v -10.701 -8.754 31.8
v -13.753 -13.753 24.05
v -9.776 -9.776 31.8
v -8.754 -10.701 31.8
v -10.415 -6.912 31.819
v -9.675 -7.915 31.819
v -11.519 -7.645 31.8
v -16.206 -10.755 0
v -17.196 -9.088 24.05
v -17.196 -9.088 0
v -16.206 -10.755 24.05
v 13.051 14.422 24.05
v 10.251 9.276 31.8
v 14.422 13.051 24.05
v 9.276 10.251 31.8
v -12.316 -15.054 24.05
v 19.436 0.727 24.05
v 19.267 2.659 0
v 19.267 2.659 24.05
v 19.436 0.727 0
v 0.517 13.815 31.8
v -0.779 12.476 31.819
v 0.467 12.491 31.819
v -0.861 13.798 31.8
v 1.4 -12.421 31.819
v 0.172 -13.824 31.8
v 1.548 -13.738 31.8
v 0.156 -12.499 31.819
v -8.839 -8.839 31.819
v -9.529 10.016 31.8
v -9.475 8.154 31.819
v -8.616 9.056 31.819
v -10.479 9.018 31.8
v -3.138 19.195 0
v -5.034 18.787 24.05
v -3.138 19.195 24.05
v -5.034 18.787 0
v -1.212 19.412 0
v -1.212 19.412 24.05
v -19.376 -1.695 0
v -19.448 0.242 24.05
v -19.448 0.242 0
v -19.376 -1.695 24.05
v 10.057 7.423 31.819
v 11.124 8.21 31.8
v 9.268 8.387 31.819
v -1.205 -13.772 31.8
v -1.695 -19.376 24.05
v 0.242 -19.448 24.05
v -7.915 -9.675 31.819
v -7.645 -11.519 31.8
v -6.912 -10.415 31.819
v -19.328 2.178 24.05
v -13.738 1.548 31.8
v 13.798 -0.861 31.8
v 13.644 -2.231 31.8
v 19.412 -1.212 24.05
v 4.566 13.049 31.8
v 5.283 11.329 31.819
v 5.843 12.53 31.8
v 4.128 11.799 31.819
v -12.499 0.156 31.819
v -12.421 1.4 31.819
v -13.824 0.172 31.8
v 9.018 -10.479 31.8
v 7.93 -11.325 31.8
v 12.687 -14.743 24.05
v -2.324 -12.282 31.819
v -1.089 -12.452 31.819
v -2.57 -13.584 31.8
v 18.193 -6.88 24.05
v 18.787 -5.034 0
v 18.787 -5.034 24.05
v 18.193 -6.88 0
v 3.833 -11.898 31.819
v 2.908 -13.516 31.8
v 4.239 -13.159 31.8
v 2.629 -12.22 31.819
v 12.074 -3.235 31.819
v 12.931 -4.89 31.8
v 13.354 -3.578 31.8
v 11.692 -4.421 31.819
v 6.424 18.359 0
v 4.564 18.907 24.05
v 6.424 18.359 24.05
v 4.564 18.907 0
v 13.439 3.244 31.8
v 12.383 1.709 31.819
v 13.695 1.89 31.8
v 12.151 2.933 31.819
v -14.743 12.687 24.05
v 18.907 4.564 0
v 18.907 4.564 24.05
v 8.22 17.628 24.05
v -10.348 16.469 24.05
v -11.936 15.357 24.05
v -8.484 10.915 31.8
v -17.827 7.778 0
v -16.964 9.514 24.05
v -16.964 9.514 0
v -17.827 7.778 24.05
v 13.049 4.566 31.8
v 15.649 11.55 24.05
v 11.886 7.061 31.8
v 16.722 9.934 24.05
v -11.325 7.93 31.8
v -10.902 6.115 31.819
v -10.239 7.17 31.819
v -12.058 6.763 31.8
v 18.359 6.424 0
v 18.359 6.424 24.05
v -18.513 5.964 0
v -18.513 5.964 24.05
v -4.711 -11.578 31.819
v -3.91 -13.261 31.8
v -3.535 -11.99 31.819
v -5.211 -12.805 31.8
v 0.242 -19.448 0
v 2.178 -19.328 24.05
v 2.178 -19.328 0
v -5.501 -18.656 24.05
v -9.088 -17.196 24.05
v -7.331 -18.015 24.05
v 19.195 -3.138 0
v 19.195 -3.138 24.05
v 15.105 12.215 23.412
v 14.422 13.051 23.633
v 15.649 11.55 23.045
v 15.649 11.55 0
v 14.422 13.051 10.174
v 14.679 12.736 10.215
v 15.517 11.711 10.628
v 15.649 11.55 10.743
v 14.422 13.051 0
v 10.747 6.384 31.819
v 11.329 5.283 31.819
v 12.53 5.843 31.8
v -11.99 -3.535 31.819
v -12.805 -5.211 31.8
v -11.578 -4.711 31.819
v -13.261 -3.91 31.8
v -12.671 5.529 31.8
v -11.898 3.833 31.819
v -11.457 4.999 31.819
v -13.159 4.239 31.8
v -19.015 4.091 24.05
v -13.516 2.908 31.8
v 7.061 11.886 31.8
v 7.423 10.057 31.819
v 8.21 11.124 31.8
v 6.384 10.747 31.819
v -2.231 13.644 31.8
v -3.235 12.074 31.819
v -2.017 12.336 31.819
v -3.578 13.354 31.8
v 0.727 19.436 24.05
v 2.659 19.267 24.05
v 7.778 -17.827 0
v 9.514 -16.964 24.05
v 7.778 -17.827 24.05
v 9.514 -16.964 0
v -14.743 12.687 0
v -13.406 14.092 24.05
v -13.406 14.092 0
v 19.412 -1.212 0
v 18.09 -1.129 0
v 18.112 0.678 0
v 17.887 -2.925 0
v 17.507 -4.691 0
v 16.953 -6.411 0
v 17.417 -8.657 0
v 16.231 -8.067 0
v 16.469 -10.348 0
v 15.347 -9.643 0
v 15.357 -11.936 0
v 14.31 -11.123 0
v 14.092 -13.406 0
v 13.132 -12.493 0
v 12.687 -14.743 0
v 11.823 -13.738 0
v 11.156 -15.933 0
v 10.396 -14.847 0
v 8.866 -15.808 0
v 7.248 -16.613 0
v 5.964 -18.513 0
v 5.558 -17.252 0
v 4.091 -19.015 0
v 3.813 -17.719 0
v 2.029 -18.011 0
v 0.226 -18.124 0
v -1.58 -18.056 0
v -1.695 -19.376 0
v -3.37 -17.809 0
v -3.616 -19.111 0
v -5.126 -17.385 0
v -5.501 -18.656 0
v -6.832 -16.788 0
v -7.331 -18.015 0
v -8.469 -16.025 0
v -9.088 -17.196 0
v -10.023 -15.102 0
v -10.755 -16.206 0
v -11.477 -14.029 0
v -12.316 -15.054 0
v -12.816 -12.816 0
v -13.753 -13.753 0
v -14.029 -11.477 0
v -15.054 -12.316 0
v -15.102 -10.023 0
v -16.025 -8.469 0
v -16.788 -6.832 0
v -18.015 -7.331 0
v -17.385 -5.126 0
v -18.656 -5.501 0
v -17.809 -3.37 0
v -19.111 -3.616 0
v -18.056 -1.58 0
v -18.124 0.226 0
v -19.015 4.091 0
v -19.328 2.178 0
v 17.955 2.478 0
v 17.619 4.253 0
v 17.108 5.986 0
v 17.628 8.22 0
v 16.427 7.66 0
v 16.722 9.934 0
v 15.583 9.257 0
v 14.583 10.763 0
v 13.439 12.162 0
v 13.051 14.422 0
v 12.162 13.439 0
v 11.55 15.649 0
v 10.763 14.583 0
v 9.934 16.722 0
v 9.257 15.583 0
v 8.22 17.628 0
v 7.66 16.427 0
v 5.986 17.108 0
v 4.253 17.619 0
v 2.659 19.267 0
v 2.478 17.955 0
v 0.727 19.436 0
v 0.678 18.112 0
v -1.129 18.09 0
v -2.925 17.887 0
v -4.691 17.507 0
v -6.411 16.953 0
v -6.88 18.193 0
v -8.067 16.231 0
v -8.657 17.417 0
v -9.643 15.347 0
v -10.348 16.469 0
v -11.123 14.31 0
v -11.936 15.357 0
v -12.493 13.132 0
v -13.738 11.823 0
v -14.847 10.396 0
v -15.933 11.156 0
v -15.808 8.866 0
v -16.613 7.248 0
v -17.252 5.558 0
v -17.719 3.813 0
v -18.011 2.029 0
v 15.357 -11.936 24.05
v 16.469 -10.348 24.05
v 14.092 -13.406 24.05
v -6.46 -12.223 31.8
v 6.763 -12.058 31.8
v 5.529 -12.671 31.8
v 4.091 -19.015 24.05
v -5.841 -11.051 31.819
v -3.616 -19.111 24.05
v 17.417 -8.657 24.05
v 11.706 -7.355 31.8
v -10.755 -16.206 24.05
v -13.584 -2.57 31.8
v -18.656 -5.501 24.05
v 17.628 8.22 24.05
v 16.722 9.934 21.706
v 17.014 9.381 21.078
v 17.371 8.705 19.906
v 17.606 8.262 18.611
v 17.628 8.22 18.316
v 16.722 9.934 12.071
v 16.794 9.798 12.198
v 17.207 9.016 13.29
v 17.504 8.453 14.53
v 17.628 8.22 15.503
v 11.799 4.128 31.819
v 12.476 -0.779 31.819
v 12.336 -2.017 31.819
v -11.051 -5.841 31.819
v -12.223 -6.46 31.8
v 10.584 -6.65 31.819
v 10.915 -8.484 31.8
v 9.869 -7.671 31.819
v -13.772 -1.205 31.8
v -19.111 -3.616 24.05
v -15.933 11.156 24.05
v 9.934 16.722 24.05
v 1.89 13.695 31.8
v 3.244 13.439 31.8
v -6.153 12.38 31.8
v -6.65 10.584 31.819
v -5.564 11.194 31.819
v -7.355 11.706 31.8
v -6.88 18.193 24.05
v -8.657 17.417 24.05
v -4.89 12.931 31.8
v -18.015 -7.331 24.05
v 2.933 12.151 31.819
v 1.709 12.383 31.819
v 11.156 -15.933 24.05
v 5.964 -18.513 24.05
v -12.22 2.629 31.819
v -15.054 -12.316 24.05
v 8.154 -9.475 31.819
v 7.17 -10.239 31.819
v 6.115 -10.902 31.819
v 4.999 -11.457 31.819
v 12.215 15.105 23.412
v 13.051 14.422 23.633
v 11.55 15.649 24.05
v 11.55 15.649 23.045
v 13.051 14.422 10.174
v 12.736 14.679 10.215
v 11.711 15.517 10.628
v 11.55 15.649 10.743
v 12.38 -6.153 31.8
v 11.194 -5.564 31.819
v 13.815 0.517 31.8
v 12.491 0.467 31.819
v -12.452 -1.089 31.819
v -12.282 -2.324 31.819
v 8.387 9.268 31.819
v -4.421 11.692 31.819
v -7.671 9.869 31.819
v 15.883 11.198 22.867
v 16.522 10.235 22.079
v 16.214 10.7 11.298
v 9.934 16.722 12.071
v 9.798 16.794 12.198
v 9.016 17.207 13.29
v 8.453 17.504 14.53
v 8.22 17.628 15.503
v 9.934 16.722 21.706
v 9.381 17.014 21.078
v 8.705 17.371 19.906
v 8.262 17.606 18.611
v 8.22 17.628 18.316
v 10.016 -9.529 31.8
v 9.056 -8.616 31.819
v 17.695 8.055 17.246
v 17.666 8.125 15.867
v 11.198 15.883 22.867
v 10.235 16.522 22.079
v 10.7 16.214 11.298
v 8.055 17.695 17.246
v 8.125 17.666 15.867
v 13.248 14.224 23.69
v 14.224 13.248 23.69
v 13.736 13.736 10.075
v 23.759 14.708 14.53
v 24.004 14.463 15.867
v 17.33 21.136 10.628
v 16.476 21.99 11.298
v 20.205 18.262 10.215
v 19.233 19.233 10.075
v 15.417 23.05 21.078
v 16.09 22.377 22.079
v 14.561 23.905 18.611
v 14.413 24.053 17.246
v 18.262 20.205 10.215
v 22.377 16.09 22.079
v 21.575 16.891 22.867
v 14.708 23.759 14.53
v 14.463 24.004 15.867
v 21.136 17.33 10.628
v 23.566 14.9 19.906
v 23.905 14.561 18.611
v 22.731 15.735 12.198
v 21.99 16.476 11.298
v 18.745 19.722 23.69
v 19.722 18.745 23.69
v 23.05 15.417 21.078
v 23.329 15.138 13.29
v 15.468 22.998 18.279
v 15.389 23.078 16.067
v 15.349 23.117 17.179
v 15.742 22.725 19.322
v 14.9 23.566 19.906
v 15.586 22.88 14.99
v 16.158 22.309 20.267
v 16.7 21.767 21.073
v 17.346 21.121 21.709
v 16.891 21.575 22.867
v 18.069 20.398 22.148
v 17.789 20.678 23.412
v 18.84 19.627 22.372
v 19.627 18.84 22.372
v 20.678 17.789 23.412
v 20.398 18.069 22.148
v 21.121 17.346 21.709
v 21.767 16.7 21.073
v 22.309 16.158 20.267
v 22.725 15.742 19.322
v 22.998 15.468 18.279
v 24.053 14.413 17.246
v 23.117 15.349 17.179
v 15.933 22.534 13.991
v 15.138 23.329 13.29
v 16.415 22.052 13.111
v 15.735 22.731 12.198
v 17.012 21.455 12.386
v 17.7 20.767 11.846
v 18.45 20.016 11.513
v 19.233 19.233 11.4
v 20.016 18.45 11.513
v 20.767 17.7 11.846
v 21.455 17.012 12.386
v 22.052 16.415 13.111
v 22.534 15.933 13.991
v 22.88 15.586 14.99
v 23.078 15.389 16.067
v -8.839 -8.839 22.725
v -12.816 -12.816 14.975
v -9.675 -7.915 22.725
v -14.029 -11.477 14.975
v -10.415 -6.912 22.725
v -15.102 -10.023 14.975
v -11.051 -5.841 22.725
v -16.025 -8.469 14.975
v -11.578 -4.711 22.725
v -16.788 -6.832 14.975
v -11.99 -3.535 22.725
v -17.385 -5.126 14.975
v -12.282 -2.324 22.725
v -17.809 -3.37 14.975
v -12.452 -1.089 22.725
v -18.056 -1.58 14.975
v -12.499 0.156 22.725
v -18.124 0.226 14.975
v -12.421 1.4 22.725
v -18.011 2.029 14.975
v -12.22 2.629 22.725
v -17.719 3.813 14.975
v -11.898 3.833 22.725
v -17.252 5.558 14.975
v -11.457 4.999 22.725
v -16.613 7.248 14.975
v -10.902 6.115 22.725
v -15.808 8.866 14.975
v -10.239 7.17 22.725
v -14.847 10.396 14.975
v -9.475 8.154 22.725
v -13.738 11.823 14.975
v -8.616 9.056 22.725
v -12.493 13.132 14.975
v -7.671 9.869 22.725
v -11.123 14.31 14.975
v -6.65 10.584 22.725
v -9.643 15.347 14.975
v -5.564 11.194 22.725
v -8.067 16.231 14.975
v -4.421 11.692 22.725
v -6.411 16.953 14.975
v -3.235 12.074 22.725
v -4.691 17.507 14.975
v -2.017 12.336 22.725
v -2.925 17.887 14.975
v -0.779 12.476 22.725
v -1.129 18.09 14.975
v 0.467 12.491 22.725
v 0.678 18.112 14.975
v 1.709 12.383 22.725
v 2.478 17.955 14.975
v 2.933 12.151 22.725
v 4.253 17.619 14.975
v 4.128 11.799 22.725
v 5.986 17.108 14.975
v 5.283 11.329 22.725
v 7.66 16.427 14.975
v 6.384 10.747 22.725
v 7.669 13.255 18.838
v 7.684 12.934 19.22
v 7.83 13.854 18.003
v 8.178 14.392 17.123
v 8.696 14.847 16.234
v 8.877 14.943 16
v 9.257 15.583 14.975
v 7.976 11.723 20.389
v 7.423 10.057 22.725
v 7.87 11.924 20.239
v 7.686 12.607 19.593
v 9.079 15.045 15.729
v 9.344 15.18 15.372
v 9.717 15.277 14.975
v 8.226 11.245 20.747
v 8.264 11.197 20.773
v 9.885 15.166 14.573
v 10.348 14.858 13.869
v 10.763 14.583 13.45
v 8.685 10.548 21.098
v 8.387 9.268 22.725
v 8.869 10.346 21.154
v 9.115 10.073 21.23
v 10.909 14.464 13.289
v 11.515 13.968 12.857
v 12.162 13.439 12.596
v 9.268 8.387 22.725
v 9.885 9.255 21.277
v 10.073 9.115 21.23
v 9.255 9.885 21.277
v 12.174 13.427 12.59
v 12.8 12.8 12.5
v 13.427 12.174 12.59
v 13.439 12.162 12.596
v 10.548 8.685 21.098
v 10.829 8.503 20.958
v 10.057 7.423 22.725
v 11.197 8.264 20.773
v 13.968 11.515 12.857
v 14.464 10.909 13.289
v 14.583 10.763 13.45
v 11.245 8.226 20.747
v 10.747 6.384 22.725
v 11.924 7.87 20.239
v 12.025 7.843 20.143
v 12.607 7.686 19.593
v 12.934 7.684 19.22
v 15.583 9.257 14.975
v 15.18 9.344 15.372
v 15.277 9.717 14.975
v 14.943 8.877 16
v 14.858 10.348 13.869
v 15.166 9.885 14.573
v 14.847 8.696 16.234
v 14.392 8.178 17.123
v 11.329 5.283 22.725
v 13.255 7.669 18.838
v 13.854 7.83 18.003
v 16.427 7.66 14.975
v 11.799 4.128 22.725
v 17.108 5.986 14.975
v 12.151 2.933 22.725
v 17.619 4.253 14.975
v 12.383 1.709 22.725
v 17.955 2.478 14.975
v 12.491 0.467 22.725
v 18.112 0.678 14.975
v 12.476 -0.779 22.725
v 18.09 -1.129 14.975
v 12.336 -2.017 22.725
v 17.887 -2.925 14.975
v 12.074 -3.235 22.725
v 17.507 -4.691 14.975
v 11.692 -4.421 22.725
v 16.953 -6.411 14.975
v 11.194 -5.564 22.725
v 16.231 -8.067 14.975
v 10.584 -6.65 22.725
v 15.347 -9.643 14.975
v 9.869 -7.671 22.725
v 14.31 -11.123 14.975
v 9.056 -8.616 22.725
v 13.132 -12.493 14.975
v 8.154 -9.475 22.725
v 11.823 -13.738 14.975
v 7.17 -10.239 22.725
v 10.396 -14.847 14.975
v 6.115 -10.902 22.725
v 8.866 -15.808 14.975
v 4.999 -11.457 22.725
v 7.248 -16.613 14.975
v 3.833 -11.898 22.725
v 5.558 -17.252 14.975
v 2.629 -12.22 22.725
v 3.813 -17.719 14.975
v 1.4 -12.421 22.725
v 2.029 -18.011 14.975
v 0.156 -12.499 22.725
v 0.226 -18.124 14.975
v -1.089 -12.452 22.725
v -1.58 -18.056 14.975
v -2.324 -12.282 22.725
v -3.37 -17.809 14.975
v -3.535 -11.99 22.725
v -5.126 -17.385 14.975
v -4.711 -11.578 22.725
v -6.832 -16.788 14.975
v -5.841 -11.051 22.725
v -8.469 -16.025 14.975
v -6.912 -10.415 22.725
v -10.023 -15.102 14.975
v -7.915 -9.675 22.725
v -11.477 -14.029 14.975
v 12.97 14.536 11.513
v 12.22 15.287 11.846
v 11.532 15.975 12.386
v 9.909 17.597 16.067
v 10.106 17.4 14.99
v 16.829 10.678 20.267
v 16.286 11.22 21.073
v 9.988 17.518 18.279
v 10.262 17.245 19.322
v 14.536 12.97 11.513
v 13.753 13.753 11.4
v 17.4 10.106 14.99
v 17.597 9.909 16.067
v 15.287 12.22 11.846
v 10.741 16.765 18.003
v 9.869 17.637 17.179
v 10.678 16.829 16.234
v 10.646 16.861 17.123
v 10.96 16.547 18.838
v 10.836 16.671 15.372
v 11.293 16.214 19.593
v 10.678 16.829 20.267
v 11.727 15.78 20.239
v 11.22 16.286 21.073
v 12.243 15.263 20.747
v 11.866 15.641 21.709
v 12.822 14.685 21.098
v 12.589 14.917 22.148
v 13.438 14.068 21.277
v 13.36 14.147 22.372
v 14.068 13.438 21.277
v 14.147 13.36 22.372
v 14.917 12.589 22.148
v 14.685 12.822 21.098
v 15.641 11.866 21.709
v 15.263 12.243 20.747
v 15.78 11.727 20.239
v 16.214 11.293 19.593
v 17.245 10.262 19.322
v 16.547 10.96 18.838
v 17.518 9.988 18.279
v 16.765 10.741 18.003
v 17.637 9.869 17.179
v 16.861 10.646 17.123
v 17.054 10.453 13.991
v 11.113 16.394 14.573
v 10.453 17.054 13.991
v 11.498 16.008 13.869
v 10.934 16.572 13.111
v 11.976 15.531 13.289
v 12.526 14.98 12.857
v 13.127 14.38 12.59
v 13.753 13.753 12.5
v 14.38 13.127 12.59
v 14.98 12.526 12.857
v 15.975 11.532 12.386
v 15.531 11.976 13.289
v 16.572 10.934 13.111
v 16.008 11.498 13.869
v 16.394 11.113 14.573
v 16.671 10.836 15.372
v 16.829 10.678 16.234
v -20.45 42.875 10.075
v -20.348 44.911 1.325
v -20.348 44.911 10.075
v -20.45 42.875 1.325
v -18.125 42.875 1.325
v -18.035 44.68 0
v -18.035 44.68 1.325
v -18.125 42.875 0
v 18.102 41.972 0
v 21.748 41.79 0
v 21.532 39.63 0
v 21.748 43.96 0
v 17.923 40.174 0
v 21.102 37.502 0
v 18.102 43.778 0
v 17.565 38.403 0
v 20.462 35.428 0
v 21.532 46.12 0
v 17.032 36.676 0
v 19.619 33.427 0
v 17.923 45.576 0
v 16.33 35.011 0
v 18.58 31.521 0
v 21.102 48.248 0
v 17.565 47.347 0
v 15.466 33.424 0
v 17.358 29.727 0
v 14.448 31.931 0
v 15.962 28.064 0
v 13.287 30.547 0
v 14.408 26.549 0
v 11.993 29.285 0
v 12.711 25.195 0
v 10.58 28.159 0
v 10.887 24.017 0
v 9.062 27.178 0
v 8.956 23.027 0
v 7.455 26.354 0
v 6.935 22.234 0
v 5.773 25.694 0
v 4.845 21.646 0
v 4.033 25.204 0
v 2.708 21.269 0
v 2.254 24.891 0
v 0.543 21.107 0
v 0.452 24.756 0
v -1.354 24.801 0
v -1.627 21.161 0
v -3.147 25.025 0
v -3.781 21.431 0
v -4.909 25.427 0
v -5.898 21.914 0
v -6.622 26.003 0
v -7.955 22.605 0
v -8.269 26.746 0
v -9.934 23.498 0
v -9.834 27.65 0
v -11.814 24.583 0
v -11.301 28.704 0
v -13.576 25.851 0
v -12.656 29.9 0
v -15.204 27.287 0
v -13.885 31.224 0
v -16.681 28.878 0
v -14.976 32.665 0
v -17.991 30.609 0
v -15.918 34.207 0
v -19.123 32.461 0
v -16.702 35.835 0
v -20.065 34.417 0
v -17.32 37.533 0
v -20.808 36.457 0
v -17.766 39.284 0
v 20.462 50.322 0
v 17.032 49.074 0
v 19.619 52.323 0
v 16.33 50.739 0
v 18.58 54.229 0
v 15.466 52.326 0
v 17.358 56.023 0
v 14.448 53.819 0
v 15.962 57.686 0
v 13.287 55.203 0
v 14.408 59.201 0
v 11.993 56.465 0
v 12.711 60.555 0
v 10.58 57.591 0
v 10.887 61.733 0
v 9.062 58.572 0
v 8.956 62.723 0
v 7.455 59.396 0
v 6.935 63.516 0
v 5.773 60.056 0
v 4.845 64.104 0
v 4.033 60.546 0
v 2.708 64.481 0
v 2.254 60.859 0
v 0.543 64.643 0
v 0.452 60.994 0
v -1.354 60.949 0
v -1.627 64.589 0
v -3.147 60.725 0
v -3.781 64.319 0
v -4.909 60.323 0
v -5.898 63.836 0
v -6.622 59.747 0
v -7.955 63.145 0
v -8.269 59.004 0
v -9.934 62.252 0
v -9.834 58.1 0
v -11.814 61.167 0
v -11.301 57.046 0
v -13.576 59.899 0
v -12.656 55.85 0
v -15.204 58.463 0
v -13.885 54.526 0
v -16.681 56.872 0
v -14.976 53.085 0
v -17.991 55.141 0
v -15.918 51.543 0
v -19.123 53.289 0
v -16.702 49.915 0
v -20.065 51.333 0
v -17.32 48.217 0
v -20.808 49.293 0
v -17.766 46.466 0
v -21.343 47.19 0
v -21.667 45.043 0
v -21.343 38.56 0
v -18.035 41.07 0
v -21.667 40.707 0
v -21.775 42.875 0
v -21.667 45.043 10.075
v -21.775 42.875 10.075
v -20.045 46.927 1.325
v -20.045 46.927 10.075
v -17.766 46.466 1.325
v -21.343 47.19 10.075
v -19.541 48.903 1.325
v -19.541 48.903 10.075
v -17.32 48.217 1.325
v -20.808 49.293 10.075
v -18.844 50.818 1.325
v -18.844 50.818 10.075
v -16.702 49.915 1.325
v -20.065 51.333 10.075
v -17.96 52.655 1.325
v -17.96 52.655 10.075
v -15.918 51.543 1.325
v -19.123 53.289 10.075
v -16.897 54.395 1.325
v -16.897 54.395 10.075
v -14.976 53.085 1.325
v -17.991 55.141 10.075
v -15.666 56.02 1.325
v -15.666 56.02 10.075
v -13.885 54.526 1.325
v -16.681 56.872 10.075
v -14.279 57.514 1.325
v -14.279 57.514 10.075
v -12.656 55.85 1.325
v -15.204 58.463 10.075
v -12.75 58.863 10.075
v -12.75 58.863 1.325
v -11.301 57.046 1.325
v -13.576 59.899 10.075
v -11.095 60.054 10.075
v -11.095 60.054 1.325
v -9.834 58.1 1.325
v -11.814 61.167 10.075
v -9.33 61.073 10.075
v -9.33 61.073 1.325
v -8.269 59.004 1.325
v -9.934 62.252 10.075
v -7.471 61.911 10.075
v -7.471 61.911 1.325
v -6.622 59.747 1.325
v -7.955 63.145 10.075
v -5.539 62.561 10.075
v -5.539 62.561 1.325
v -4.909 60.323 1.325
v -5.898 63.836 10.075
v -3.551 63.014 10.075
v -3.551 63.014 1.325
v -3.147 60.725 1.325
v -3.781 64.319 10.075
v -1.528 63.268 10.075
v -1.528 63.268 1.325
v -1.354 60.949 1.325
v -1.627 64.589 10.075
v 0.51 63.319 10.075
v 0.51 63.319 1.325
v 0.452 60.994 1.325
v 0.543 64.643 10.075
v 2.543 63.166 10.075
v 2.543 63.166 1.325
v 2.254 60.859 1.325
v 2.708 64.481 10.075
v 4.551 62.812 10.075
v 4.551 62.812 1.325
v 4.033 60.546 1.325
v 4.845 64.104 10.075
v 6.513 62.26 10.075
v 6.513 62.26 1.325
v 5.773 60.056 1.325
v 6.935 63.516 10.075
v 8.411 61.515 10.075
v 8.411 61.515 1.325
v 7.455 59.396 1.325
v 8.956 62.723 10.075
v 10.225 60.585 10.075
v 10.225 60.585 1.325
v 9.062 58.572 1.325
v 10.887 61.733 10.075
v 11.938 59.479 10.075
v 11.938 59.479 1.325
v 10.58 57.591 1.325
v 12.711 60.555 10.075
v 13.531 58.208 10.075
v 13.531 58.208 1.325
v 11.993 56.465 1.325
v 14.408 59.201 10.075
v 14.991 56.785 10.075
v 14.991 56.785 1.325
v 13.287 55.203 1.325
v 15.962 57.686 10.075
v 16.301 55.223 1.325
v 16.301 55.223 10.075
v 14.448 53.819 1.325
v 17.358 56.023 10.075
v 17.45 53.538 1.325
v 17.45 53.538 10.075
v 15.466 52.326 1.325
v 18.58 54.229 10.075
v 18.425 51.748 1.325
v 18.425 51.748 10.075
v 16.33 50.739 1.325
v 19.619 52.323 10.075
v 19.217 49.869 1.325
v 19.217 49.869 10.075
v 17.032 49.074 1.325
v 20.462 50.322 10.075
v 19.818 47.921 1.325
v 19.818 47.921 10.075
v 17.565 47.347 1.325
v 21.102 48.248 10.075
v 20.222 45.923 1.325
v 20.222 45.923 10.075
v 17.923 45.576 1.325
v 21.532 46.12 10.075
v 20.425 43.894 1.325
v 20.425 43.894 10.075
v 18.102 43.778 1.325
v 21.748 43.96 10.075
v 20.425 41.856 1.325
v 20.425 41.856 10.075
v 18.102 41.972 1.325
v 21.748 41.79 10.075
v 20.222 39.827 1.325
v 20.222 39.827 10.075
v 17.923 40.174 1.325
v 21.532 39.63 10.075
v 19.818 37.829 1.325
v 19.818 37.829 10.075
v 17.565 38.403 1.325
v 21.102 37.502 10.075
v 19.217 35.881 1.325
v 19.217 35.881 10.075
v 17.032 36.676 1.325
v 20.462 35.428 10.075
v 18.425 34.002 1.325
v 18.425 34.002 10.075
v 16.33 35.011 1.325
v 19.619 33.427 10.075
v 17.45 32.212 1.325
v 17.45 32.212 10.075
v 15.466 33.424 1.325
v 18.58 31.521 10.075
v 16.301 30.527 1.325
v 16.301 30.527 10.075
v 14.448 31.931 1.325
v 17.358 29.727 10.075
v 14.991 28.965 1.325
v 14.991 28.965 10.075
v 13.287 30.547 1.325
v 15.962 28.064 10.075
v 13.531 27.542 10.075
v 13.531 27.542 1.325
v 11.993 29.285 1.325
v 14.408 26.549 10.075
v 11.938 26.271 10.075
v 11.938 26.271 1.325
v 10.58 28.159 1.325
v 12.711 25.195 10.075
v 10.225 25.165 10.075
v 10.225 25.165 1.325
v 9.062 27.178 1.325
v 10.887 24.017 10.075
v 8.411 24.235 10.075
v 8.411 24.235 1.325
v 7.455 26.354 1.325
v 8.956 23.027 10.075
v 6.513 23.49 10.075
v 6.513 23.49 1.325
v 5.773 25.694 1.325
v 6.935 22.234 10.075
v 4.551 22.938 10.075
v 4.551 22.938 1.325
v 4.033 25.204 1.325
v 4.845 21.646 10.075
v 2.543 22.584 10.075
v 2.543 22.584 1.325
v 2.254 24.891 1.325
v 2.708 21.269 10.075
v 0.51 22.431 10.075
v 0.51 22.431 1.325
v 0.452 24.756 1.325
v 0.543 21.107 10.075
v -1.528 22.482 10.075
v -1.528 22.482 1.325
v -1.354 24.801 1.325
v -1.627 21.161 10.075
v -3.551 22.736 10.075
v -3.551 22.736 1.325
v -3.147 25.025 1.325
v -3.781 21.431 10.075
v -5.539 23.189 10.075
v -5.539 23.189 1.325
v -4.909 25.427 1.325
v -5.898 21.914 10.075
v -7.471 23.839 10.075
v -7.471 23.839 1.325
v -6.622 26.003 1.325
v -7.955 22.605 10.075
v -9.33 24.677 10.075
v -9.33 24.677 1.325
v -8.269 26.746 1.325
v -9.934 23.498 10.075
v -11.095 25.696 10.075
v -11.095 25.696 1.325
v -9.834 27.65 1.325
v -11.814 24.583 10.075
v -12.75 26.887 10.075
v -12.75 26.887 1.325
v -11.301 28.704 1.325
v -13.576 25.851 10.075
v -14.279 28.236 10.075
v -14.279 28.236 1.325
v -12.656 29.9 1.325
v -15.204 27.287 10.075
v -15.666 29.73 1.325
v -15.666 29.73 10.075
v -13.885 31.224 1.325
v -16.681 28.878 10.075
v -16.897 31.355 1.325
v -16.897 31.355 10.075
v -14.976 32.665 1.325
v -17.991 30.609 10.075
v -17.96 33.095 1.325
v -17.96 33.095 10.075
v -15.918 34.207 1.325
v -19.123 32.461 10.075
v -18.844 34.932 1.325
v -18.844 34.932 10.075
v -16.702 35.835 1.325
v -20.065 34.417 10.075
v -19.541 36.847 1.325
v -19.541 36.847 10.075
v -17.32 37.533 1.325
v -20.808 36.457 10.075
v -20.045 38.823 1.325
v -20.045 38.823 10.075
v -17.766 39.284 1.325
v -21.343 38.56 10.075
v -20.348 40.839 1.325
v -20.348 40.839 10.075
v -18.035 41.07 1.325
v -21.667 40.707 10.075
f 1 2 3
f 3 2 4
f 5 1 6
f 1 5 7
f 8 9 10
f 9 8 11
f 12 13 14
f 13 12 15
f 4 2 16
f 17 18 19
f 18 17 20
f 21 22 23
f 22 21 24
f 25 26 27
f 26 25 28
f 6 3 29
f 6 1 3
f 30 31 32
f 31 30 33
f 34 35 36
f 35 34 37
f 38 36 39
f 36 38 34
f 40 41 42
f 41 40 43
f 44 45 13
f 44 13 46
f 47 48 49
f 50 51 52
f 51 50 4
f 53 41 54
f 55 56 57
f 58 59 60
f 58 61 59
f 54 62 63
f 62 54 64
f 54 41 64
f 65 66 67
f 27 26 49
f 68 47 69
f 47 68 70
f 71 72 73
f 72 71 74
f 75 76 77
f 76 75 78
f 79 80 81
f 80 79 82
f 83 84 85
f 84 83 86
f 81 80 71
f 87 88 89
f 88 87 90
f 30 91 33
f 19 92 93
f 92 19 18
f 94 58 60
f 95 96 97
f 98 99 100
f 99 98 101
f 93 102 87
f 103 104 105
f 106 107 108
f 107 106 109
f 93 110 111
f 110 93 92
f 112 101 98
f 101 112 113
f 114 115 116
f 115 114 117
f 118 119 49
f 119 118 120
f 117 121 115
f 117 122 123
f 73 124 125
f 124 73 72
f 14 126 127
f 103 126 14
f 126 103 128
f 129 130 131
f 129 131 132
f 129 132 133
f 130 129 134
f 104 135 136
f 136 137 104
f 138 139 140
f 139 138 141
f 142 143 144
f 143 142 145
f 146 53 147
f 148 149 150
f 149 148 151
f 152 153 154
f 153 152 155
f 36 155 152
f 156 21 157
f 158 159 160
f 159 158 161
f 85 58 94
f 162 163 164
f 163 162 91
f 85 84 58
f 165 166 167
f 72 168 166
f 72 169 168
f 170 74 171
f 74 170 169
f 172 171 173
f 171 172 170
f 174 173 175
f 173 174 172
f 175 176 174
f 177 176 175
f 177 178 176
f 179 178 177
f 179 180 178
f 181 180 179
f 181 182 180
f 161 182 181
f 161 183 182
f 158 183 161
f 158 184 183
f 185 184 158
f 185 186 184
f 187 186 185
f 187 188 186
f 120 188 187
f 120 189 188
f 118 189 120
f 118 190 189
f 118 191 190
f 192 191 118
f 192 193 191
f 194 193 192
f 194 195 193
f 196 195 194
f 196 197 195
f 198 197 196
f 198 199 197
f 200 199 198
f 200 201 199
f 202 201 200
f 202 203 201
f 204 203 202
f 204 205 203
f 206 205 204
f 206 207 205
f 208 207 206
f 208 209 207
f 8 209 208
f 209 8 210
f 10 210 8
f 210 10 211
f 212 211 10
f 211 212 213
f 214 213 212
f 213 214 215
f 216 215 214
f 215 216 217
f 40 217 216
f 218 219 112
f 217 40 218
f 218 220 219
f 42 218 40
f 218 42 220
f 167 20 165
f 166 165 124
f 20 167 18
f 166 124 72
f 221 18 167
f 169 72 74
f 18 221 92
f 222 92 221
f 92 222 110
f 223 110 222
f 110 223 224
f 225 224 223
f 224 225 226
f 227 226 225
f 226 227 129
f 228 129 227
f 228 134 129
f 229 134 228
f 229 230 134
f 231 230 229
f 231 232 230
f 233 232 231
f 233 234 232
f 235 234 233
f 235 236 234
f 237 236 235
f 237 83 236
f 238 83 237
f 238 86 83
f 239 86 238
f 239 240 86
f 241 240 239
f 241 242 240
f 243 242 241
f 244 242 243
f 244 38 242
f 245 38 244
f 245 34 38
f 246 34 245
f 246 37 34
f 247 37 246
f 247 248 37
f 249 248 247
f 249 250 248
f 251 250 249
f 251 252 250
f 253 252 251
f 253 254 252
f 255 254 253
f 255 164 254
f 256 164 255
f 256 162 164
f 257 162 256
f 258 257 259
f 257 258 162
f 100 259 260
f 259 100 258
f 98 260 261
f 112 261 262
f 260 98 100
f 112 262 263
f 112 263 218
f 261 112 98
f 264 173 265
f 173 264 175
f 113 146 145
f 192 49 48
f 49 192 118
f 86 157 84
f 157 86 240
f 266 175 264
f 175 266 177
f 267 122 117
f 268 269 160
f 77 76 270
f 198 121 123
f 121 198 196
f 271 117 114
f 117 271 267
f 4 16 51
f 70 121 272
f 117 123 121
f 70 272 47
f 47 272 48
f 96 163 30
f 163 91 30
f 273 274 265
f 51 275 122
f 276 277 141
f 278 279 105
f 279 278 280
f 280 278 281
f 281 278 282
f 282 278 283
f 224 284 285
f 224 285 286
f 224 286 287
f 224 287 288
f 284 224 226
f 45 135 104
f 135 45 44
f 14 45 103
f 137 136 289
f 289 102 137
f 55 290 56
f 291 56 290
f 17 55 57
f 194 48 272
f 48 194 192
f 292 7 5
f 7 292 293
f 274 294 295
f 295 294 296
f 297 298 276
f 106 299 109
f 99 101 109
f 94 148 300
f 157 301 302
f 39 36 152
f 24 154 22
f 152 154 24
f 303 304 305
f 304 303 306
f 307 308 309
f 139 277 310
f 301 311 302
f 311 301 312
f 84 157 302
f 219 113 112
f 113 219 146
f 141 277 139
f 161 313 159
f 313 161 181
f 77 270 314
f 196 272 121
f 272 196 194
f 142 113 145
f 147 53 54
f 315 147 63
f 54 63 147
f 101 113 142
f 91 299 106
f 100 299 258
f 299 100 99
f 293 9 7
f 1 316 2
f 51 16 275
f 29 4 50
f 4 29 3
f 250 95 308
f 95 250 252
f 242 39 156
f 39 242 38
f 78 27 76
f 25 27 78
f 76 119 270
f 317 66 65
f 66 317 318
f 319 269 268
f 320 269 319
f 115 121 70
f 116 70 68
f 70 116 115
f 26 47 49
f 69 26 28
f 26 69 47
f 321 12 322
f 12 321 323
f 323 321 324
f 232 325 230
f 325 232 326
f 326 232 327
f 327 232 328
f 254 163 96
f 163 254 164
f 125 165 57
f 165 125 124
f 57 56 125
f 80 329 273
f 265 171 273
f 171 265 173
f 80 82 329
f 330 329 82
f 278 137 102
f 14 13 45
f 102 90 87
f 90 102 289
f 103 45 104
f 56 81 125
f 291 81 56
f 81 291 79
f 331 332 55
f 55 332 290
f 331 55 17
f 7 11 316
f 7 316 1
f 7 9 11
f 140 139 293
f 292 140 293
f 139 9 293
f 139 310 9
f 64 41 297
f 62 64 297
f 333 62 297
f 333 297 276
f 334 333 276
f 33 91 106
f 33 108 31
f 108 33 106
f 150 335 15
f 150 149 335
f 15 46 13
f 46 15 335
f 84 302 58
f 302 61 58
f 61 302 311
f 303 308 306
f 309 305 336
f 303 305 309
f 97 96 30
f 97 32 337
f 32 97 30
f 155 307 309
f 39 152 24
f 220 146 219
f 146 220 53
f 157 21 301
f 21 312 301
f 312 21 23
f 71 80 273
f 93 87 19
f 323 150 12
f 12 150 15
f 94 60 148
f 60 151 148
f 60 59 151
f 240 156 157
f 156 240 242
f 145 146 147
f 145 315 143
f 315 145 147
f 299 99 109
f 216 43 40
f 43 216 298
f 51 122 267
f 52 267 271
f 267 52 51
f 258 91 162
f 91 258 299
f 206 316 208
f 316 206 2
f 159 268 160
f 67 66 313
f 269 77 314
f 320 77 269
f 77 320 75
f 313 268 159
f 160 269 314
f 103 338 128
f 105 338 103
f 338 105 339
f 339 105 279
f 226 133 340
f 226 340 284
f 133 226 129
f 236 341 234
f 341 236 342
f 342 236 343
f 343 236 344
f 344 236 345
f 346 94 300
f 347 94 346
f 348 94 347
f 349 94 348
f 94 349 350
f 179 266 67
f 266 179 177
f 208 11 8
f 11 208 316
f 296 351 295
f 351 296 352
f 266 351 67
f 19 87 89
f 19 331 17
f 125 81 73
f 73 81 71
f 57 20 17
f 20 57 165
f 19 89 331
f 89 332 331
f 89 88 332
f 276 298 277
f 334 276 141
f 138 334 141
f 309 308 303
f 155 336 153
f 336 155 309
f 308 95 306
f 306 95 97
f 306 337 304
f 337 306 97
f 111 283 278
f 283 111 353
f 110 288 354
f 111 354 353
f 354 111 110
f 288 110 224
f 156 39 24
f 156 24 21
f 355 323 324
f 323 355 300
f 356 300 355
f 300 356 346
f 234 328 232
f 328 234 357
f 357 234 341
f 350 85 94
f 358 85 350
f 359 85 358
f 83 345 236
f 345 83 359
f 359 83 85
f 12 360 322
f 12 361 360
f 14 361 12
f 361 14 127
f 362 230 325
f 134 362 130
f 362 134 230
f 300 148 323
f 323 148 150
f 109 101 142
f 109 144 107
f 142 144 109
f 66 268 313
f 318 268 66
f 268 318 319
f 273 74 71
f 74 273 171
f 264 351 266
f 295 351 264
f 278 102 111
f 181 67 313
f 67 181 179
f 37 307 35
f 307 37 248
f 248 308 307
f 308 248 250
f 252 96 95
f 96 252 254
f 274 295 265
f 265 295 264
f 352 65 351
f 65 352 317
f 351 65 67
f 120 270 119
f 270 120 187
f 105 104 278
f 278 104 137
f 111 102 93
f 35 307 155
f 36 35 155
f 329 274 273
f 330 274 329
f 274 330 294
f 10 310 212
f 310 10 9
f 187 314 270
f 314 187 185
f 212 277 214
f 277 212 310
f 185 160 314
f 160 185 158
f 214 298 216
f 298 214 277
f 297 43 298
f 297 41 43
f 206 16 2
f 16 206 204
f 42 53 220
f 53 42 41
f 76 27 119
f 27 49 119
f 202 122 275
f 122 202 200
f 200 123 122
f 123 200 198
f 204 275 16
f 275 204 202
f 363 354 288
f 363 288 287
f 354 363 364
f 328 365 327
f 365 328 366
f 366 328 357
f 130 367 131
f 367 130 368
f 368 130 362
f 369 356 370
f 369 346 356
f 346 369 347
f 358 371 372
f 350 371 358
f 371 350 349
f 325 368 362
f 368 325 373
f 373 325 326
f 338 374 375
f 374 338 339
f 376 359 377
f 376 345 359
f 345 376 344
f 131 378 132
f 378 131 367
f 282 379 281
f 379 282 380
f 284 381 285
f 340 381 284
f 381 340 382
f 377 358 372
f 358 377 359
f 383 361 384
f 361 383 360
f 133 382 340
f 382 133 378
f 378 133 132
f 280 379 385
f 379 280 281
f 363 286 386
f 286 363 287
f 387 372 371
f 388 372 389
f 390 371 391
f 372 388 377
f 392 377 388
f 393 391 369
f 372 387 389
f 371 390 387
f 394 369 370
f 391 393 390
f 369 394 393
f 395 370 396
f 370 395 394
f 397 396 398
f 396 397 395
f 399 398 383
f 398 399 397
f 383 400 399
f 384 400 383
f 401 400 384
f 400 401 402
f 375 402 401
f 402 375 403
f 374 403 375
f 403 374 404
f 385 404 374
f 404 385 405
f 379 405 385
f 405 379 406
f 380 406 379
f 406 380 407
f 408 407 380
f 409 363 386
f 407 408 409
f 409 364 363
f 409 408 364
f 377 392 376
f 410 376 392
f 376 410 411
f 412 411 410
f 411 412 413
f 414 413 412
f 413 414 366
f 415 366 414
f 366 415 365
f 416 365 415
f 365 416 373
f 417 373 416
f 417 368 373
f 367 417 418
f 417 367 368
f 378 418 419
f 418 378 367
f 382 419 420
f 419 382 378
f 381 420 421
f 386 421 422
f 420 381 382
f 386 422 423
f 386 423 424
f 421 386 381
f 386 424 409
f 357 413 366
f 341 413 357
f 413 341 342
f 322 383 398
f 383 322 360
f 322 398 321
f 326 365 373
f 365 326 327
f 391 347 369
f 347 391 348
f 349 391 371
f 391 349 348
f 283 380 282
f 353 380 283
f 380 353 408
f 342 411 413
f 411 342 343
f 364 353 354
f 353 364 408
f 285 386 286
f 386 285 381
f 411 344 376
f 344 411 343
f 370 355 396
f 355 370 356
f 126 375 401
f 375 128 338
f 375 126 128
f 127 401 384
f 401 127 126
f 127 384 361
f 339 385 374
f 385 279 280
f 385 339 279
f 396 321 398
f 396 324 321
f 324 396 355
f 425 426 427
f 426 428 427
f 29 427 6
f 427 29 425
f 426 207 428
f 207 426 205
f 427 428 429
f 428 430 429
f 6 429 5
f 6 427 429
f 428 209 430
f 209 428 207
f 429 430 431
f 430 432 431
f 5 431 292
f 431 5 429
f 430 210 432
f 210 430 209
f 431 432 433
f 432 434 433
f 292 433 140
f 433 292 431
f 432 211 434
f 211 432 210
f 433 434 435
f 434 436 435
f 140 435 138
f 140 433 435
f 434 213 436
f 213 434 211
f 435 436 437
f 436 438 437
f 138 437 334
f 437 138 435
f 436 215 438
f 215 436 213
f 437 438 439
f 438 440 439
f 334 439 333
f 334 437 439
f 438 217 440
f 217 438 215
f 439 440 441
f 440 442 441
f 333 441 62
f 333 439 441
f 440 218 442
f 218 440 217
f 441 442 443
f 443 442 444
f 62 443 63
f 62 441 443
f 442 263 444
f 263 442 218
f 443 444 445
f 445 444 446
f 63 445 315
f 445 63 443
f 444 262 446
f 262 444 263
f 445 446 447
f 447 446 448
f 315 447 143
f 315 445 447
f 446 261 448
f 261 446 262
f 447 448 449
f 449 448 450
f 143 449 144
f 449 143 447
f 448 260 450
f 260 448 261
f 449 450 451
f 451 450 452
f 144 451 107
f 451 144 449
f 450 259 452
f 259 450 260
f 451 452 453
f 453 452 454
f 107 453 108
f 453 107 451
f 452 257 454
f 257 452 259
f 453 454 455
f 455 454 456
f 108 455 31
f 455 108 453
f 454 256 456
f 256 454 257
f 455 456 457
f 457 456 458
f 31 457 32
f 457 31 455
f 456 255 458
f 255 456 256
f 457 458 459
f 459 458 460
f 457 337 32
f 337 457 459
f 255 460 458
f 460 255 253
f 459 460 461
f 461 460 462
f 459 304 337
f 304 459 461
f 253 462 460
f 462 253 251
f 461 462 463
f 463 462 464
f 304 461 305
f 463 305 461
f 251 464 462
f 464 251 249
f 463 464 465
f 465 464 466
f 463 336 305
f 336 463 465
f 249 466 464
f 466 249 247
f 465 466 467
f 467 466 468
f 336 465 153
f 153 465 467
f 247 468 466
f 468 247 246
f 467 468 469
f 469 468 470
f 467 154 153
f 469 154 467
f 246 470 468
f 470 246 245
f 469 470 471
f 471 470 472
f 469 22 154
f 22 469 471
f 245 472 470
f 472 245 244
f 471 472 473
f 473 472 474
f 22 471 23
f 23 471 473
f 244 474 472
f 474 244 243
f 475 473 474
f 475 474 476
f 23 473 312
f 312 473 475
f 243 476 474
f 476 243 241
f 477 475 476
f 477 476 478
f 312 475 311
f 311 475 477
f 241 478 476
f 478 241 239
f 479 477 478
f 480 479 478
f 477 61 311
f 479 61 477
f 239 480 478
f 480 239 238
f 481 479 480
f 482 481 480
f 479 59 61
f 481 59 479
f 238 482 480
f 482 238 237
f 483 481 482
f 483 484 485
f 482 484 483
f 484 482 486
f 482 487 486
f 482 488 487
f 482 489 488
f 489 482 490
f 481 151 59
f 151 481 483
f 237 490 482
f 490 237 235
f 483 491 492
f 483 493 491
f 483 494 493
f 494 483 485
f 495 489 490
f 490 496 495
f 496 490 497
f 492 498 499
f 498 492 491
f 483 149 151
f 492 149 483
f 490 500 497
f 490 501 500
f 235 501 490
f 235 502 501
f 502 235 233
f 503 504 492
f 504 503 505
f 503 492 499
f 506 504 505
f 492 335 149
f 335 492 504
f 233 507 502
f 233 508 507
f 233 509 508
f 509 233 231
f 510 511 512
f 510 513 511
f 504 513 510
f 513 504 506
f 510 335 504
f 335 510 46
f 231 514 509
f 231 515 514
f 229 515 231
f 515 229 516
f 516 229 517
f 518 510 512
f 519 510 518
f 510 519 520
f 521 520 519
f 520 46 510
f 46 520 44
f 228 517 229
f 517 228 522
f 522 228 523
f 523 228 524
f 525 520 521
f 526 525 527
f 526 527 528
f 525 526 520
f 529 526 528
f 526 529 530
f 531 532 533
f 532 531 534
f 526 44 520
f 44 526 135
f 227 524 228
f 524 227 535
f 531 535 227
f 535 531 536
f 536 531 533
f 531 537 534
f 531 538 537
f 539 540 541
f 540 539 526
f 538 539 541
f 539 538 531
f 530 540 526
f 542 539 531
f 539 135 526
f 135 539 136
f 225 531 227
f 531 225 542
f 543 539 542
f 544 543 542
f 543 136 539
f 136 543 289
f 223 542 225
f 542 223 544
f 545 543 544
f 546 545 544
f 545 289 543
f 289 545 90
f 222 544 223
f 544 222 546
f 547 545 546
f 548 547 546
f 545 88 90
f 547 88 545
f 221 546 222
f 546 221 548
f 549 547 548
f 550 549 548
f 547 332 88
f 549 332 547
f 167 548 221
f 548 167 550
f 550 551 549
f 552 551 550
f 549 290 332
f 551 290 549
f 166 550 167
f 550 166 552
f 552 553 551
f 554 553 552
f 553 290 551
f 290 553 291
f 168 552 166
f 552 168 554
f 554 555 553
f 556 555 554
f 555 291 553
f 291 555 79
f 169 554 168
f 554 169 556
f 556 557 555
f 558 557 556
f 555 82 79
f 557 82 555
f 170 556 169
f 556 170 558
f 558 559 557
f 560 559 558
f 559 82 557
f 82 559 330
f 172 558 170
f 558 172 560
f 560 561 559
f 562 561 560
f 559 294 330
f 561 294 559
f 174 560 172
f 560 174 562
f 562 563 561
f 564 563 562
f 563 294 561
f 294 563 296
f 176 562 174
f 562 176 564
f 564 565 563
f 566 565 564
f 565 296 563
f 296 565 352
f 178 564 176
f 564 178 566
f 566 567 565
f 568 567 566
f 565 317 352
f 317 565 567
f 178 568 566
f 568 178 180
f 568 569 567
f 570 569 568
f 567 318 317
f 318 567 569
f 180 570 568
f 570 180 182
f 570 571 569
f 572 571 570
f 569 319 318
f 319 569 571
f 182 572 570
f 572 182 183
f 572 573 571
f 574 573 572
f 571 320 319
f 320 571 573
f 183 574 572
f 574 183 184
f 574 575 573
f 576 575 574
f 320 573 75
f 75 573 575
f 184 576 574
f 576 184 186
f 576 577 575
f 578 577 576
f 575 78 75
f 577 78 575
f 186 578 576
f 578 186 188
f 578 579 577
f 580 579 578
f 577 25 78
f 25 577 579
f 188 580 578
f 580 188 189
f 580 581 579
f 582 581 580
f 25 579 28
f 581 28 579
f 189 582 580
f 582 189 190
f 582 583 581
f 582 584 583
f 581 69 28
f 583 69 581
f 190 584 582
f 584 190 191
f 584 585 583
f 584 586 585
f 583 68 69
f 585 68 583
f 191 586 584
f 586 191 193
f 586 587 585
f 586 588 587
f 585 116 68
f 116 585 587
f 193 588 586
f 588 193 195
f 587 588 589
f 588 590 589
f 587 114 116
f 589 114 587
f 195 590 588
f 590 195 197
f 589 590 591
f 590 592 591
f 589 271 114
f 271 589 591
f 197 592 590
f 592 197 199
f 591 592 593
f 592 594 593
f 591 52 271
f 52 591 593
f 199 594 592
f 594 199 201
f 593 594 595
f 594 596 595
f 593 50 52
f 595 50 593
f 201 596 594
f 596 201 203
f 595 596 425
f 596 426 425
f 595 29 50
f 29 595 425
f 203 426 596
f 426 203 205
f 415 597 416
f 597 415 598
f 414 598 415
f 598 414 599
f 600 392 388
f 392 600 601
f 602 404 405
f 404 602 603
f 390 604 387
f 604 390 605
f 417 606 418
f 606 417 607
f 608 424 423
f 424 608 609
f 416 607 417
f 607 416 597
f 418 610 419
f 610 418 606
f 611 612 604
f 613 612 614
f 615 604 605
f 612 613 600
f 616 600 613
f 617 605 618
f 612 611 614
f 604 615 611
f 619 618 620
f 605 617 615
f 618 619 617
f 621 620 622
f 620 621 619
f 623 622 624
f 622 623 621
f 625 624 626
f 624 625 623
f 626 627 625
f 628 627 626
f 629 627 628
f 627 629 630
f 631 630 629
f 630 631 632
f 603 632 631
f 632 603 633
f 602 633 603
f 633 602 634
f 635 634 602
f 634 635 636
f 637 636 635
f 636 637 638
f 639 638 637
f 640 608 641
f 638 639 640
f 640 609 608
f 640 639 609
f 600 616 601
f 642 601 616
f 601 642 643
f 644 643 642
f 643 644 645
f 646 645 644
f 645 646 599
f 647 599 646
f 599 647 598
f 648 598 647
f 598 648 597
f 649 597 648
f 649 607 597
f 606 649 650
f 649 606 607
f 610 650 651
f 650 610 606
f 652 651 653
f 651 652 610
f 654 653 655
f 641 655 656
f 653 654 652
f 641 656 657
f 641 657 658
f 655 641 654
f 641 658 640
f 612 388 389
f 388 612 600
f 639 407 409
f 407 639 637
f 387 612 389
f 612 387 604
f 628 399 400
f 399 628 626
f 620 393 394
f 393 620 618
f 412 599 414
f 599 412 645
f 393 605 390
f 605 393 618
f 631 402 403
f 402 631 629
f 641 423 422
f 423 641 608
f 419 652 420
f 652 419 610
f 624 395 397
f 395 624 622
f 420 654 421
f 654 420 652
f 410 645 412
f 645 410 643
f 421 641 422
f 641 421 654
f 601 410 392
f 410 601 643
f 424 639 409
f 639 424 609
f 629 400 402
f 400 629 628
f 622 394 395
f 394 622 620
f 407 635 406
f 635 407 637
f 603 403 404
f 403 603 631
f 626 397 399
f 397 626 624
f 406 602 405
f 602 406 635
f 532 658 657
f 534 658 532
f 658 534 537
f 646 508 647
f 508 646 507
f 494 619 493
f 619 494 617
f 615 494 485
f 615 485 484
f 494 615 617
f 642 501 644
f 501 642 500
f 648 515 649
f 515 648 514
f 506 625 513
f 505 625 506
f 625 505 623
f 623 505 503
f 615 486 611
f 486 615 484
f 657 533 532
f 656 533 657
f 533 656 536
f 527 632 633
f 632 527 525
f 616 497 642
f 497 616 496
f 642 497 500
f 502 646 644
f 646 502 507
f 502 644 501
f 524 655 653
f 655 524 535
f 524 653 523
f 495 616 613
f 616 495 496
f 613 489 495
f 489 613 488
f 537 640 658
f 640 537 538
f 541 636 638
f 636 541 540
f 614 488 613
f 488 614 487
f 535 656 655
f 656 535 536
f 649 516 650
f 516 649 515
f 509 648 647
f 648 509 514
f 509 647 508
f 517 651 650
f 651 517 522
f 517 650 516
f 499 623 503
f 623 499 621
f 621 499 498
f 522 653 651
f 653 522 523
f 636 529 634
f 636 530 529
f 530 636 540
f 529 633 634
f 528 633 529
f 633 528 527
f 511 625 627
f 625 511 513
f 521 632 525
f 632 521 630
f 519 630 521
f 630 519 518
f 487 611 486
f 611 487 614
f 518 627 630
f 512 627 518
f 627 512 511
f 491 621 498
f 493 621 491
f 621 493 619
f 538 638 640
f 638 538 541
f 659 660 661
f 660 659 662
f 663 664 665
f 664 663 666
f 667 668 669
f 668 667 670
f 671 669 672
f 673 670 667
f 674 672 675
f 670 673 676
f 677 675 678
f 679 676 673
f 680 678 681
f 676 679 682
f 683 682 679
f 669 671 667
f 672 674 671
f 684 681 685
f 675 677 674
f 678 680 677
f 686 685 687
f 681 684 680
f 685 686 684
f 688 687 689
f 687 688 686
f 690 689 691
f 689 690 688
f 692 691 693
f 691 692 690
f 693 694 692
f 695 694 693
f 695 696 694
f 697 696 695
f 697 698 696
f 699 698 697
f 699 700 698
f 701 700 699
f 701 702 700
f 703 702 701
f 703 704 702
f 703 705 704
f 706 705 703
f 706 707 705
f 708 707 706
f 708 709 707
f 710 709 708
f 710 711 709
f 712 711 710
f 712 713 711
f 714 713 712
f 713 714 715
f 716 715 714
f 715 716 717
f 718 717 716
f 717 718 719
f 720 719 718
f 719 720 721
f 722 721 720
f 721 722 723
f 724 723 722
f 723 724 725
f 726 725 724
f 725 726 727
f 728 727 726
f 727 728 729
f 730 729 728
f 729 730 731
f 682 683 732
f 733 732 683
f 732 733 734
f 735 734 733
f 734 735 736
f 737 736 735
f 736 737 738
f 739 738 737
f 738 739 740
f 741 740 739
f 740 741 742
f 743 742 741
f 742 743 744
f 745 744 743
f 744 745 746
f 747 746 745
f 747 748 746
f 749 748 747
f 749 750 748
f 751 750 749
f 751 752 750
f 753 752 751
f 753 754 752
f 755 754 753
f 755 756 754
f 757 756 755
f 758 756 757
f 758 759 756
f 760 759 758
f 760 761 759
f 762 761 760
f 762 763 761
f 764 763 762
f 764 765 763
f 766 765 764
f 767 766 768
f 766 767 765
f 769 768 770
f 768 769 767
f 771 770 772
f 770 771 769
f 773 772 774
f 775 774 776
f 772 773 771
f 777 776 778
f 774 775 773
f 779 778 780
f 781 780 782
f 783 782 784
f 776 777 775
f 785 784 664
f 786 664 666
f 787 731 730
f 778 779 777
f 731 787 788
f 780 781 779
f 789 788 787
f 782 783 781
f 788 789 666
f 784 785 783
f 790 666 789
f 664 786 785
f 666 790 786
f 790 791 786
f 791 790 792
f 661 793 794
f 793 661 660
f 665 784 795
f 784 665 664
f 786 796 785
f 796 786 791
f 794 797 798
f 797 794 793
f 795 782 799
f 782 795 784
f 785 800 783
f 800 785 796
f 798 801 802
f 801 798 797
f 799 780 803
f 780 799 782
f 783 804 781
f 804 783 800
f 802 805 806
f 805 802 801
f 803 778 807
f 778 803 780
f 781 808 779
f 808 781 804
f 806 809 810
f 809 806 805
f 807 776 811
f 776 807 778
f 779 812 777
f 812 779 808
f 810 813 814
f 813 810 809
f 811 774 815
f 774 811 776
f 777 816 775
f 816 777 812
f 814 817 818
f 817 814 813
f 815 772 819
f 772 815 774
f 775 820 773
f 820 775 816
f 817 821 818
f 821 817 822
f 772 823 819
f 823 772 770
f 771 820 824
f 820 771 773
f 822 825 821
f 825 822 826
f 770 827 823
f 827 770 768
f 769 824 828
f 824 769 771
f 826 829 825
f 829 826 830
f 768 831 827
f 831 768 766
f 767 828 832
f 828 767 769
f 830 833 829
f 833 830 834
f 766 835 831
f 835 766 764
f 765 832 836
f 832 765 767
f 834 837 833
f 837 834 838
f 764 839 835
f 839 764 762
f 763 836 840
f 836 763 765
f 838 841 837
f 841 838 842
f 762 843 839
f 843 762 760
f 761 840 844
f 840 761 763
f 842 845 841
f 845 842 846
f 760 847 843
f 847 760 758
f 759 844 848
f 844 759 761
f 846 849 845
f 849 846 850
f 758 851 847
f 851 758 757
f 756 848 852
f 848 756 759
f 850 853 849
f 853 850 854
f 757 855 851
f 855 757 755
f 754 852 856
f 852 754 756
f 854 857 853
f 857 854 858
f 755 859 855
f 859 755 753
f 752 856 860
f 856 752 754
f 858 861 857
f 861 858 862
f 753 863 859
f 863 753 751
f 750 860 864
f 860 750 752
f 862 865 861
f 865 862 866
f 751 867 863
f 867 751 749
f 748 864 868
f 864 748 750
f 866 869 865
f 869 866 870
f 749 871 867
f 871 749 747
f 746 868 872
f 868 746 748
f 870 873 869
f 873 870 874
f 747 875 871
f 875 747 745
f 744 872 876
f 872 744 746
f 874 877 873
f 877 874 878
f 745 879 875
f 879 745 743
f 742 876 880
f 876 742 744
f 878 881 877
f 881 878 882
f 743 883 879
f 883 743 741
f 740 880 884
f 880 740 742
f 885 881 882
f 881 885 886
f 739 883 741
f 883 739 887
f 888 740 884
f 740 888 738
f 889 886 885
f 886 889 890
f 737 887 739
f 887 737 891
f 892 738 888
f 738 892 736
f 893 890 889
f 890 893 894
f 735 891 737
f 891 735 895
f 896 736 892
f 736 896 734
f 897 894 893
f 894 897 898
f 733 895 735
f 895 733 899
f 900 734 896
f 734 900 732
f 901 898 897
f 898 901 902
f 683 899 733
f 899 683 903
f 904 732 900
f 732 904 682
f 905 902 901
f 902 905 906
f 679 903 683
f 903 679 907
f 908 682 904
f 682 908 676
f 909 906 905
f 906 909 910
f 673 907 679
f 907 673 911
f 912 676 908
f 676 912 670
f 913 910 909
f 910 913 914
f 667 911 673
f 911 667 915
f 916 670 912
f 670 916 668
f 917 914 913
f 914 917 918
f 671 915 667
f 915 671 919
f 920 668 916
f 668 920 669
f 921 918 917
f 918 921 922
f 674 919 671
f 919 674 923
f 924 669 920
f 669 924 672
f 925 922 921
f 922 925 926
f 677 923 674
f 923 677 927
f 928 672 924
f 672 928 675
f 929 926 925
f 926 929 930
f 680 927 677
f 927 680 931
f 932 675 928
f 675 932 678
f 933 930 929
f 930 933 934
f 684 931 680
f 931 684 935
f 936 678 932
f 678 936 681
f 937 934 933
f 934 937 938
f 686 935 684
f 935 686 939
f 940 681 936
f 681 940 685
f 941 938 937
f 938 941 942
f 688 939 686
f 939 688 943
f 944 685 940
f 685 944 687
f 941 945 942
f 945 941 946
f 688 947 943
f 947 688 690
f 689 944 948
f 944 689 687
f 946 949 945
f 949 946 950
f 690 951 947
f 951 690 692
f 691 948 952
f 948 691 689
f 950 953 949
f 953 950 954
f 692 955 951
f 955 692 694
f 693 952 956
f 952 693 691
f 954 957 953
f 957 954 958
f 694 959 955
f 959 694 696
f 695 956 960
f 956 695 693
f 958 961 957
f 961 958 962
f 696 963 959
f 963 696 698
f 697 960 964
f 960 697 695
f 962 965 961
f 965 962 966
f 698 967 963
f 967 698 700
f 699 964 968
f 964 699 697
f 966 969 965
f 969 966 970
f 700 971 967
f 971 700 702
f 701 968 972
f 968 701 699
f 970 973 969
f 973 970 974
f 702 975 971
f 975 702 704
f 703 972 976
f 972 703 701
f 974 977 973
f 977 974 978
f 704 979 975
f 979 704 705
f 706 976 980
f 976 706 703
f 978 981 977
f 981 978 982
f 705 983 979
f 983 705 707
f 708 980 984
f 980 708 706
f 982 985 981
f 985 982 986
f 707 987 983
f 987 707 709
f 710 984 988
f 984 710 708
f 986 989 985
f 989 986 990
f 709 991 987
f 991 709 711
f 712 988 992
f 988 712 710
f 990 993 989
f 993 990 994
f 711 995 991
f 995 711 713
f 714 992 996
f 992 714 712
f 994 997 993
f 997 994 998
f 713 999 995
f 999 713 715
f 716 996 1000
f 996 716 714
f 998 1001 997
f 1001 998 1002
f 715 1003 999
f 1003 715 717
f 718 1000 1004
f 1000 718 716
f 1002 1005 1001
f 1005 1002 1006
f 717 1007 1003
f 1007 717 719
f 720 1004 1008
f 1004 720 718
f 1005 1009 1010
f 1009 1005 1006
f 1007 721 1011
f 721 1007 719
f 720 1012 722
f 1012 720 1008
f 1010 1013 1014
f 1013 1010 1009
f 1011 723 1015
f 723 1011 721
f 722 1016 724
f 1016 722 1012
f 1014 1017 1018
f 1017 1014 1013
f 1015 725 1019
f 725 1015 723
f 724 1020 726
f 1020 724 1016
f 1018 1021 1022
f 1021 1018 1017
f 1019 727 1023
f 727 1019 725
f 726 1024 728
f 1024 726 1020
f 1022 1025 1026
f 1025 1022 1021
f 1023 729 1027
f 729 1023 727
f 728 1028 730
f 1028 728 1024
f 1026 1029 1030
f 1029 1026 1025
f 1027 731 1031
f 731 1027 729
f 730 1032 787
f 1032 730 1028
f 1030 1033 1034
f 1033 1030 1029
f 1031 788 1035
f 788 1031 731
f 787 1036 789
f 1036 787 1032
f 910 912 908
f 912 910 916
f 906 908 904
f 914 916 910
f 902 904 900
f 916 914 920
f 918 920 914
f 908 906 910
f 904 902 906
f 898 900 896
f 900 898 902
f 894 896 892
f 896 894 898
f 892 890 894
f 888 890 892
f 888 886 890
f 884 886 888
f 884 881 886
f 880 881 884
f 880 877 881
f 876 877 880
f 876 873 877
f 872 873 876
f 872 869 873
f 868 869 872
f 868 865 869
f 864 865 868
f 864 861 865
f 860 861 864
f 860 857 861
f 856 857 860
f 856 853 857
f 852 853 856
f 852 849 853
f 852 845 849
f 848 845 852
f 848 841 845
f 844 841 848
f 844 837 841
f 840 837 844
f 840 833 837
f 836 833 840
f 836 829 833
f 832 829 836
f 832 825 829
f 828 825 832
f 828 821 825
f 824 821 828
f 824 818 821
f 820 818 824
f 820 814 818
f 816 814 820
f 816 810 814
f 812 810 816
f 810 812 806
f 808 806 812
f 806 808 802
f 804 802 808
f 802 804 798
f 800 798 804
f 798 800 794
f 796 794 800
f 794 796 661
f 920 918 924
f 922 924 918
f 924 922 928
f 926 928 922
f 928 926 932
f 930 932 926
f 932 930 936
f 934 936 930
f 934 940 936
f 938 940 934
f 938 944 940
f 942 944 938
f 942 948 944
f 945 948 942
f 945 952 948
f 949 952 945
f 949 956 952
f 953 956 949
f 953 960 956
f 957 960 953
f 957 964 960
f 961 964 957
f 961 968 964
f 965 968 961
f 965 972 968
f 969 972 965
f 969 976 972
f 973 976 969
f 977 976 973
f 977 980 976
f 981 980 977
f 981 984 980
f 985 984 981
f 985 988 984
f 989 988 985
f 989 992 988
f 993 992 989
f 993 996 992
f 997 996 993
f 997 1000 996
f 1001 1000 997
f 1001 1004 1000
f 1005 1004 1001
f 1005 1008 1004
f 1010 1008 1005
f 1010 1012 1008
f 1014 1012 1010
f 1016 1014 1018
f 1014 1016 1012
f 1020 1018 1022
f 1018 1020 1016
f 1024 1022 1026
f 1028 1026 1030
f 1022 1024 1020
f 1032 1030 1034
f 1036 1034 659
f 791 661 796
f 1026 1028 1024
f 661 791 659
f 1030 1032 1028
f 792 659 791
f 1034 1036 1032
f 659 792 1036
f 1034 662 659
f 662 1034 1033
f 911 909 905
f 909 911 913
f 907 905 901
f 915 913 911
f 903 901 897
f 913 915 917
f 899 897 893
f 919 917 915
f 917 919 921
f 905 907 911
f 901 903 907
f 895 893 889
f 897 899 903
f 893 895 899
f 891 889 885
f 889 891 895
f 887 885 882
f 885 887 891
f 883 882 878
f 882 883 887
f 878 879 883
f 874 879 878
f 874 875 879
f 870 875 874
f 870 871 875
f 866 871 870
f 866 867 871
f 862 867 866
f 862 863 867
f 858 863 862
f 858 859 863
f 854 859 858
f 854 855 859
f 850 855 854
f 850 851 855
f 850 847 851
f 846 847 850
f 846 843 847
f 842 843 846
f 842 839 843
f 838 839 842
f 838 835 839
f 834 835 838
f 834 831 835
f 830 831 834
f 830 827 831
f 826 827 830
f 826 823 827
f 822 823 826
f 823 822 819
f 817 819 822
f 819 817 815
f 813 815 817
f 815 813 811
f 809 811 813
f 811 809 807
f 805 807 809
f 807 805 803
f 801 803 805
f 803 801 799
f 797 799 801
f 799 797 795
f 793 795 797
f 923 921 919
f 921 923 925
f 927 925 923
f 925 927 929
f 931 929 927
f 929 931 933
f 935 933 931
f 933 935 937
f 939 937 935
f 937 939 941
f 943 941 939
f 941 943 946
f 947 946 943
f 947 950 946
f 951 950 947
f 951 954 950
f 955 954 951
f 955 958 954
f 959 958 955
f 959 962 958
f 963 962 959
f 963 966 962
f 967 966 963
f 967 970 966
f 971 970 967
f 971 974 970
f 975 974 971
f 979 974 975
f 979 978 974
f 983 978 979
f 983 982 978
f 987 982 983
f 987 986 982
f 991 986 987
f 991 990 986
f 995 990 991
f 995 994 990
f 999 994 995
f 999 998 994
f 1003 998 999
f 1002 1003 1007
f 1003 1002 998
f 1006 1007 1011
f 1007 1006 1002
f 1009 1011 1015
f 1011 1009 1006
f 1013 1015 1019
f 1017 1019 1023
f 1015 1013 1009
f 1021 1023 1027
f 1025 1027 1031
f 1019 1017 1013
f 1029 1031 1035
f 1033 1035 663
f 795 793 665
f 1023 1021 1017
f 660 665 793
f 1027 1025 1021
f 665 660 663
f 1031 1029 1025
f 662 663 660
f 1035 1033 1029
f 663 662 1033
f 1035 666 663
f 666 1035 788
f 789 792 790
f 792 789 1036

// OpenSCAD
// adjust those
pipe_diameter = 25;
tube_diameter = 11;     // air suppy tube, doesn't matter if you use your mouth
rubber_thickness = 1;

// probably don't change those
min_wall = 1.2 + pipe_diameter * 0.005;

// proportions
inner_diameter = pipe_diameter * 1.25 + 5;
stuck_width = pipe_diameter*0.15 + 4;
fn = round(pipe_diameter * 2.5);

// inner part
rotate([0, 0, 45])
difference(){
    union(){
        rotate_extrude($fn=fn) polygon
            (points=[
                [0, 0],
                [inner_diameter/2 + min_wall,0],
                [inner_diameter/2 + min_wall, stuck_width + min_wall*4 + tube_diameter],
                [pipe_diameter/2 + min_wall, stuck_width*2 + min_wall*4 + tube_diameter],
                [0, stuck_width + min_wall*10 + tube_diameter]]);
        translate ([0, 0, stuck_width + min_wall*2 + tube_diameter/2+ rubber_thickness])
            rotate ([0, 90, 0])
                cylinder 
                    (inner_diameter/2 + min_wall + stuck_width, 
                    tube_diameter/2 + min_wall, tube_diameter/2 + min_wall, $fn=fn/2);
    };
     union(){
        rotate_extrude($fn=fn) polygon
            (points=[
                [0, -1],
                [inner_diameter/2, -1],
                [inner_diameter/2, min_wall*3 + tube_diameter],
                [pipe_diameter/2, stuck_width + min_wall*3 + tube_diameter],
                [pipe_diameter/2, stuck_width*2 + min_wall*4 + tube_diameter +1],
                [0, stuck_width + min_wall*10 + tube_diameter +1]]);
        translate ([inner_diameter/2 + min_wall, 0, stuck_width + min_wall*2 + tube_diameter/2 + rubber_thickness])
            rotate ([0, 90, 0])
                cylinder 
                    (inner_diameter/2 + min_wall + stuck_width, 
                    tube_diameter/2, tube_diameter/2, $fn=fn/2);
         translate ([0, 0, stuck_width + min_wall*2 + tube_diameter/2 + rubber_thickness])
            rotate ([0, 90, 0])
                cylinder 
                    (inner_diameter/2 + min_wall + stuck_width, 
                    tube_diameter*0.4, tube_diameter*0.4, $fn=fn/2);
    };   
}

// outer part
translate([0, inner_diameter + 5*min_wall, min_wall + rubber_thickness])
rotate_extrude($fn=fn) polygon
    (points=[
        [inner_diameter/2, -rubber_thickness - min_wall],
        [inner_diameter/2 + min_wall*2 + rubber_thickness, -rubber_thickness - min_wall],
        [inner_diameter/2 + min_wall*2 + rubber_thickness, stuck_width],
        [inner_diameter/2 + min_wall + rubber_thickness, stuck_width],
        [inner_diameter/2 + min_wall + rubber_thickness, -rubber_thickness],
        [inner_diameter/2, -rubber_thickness]]);  
